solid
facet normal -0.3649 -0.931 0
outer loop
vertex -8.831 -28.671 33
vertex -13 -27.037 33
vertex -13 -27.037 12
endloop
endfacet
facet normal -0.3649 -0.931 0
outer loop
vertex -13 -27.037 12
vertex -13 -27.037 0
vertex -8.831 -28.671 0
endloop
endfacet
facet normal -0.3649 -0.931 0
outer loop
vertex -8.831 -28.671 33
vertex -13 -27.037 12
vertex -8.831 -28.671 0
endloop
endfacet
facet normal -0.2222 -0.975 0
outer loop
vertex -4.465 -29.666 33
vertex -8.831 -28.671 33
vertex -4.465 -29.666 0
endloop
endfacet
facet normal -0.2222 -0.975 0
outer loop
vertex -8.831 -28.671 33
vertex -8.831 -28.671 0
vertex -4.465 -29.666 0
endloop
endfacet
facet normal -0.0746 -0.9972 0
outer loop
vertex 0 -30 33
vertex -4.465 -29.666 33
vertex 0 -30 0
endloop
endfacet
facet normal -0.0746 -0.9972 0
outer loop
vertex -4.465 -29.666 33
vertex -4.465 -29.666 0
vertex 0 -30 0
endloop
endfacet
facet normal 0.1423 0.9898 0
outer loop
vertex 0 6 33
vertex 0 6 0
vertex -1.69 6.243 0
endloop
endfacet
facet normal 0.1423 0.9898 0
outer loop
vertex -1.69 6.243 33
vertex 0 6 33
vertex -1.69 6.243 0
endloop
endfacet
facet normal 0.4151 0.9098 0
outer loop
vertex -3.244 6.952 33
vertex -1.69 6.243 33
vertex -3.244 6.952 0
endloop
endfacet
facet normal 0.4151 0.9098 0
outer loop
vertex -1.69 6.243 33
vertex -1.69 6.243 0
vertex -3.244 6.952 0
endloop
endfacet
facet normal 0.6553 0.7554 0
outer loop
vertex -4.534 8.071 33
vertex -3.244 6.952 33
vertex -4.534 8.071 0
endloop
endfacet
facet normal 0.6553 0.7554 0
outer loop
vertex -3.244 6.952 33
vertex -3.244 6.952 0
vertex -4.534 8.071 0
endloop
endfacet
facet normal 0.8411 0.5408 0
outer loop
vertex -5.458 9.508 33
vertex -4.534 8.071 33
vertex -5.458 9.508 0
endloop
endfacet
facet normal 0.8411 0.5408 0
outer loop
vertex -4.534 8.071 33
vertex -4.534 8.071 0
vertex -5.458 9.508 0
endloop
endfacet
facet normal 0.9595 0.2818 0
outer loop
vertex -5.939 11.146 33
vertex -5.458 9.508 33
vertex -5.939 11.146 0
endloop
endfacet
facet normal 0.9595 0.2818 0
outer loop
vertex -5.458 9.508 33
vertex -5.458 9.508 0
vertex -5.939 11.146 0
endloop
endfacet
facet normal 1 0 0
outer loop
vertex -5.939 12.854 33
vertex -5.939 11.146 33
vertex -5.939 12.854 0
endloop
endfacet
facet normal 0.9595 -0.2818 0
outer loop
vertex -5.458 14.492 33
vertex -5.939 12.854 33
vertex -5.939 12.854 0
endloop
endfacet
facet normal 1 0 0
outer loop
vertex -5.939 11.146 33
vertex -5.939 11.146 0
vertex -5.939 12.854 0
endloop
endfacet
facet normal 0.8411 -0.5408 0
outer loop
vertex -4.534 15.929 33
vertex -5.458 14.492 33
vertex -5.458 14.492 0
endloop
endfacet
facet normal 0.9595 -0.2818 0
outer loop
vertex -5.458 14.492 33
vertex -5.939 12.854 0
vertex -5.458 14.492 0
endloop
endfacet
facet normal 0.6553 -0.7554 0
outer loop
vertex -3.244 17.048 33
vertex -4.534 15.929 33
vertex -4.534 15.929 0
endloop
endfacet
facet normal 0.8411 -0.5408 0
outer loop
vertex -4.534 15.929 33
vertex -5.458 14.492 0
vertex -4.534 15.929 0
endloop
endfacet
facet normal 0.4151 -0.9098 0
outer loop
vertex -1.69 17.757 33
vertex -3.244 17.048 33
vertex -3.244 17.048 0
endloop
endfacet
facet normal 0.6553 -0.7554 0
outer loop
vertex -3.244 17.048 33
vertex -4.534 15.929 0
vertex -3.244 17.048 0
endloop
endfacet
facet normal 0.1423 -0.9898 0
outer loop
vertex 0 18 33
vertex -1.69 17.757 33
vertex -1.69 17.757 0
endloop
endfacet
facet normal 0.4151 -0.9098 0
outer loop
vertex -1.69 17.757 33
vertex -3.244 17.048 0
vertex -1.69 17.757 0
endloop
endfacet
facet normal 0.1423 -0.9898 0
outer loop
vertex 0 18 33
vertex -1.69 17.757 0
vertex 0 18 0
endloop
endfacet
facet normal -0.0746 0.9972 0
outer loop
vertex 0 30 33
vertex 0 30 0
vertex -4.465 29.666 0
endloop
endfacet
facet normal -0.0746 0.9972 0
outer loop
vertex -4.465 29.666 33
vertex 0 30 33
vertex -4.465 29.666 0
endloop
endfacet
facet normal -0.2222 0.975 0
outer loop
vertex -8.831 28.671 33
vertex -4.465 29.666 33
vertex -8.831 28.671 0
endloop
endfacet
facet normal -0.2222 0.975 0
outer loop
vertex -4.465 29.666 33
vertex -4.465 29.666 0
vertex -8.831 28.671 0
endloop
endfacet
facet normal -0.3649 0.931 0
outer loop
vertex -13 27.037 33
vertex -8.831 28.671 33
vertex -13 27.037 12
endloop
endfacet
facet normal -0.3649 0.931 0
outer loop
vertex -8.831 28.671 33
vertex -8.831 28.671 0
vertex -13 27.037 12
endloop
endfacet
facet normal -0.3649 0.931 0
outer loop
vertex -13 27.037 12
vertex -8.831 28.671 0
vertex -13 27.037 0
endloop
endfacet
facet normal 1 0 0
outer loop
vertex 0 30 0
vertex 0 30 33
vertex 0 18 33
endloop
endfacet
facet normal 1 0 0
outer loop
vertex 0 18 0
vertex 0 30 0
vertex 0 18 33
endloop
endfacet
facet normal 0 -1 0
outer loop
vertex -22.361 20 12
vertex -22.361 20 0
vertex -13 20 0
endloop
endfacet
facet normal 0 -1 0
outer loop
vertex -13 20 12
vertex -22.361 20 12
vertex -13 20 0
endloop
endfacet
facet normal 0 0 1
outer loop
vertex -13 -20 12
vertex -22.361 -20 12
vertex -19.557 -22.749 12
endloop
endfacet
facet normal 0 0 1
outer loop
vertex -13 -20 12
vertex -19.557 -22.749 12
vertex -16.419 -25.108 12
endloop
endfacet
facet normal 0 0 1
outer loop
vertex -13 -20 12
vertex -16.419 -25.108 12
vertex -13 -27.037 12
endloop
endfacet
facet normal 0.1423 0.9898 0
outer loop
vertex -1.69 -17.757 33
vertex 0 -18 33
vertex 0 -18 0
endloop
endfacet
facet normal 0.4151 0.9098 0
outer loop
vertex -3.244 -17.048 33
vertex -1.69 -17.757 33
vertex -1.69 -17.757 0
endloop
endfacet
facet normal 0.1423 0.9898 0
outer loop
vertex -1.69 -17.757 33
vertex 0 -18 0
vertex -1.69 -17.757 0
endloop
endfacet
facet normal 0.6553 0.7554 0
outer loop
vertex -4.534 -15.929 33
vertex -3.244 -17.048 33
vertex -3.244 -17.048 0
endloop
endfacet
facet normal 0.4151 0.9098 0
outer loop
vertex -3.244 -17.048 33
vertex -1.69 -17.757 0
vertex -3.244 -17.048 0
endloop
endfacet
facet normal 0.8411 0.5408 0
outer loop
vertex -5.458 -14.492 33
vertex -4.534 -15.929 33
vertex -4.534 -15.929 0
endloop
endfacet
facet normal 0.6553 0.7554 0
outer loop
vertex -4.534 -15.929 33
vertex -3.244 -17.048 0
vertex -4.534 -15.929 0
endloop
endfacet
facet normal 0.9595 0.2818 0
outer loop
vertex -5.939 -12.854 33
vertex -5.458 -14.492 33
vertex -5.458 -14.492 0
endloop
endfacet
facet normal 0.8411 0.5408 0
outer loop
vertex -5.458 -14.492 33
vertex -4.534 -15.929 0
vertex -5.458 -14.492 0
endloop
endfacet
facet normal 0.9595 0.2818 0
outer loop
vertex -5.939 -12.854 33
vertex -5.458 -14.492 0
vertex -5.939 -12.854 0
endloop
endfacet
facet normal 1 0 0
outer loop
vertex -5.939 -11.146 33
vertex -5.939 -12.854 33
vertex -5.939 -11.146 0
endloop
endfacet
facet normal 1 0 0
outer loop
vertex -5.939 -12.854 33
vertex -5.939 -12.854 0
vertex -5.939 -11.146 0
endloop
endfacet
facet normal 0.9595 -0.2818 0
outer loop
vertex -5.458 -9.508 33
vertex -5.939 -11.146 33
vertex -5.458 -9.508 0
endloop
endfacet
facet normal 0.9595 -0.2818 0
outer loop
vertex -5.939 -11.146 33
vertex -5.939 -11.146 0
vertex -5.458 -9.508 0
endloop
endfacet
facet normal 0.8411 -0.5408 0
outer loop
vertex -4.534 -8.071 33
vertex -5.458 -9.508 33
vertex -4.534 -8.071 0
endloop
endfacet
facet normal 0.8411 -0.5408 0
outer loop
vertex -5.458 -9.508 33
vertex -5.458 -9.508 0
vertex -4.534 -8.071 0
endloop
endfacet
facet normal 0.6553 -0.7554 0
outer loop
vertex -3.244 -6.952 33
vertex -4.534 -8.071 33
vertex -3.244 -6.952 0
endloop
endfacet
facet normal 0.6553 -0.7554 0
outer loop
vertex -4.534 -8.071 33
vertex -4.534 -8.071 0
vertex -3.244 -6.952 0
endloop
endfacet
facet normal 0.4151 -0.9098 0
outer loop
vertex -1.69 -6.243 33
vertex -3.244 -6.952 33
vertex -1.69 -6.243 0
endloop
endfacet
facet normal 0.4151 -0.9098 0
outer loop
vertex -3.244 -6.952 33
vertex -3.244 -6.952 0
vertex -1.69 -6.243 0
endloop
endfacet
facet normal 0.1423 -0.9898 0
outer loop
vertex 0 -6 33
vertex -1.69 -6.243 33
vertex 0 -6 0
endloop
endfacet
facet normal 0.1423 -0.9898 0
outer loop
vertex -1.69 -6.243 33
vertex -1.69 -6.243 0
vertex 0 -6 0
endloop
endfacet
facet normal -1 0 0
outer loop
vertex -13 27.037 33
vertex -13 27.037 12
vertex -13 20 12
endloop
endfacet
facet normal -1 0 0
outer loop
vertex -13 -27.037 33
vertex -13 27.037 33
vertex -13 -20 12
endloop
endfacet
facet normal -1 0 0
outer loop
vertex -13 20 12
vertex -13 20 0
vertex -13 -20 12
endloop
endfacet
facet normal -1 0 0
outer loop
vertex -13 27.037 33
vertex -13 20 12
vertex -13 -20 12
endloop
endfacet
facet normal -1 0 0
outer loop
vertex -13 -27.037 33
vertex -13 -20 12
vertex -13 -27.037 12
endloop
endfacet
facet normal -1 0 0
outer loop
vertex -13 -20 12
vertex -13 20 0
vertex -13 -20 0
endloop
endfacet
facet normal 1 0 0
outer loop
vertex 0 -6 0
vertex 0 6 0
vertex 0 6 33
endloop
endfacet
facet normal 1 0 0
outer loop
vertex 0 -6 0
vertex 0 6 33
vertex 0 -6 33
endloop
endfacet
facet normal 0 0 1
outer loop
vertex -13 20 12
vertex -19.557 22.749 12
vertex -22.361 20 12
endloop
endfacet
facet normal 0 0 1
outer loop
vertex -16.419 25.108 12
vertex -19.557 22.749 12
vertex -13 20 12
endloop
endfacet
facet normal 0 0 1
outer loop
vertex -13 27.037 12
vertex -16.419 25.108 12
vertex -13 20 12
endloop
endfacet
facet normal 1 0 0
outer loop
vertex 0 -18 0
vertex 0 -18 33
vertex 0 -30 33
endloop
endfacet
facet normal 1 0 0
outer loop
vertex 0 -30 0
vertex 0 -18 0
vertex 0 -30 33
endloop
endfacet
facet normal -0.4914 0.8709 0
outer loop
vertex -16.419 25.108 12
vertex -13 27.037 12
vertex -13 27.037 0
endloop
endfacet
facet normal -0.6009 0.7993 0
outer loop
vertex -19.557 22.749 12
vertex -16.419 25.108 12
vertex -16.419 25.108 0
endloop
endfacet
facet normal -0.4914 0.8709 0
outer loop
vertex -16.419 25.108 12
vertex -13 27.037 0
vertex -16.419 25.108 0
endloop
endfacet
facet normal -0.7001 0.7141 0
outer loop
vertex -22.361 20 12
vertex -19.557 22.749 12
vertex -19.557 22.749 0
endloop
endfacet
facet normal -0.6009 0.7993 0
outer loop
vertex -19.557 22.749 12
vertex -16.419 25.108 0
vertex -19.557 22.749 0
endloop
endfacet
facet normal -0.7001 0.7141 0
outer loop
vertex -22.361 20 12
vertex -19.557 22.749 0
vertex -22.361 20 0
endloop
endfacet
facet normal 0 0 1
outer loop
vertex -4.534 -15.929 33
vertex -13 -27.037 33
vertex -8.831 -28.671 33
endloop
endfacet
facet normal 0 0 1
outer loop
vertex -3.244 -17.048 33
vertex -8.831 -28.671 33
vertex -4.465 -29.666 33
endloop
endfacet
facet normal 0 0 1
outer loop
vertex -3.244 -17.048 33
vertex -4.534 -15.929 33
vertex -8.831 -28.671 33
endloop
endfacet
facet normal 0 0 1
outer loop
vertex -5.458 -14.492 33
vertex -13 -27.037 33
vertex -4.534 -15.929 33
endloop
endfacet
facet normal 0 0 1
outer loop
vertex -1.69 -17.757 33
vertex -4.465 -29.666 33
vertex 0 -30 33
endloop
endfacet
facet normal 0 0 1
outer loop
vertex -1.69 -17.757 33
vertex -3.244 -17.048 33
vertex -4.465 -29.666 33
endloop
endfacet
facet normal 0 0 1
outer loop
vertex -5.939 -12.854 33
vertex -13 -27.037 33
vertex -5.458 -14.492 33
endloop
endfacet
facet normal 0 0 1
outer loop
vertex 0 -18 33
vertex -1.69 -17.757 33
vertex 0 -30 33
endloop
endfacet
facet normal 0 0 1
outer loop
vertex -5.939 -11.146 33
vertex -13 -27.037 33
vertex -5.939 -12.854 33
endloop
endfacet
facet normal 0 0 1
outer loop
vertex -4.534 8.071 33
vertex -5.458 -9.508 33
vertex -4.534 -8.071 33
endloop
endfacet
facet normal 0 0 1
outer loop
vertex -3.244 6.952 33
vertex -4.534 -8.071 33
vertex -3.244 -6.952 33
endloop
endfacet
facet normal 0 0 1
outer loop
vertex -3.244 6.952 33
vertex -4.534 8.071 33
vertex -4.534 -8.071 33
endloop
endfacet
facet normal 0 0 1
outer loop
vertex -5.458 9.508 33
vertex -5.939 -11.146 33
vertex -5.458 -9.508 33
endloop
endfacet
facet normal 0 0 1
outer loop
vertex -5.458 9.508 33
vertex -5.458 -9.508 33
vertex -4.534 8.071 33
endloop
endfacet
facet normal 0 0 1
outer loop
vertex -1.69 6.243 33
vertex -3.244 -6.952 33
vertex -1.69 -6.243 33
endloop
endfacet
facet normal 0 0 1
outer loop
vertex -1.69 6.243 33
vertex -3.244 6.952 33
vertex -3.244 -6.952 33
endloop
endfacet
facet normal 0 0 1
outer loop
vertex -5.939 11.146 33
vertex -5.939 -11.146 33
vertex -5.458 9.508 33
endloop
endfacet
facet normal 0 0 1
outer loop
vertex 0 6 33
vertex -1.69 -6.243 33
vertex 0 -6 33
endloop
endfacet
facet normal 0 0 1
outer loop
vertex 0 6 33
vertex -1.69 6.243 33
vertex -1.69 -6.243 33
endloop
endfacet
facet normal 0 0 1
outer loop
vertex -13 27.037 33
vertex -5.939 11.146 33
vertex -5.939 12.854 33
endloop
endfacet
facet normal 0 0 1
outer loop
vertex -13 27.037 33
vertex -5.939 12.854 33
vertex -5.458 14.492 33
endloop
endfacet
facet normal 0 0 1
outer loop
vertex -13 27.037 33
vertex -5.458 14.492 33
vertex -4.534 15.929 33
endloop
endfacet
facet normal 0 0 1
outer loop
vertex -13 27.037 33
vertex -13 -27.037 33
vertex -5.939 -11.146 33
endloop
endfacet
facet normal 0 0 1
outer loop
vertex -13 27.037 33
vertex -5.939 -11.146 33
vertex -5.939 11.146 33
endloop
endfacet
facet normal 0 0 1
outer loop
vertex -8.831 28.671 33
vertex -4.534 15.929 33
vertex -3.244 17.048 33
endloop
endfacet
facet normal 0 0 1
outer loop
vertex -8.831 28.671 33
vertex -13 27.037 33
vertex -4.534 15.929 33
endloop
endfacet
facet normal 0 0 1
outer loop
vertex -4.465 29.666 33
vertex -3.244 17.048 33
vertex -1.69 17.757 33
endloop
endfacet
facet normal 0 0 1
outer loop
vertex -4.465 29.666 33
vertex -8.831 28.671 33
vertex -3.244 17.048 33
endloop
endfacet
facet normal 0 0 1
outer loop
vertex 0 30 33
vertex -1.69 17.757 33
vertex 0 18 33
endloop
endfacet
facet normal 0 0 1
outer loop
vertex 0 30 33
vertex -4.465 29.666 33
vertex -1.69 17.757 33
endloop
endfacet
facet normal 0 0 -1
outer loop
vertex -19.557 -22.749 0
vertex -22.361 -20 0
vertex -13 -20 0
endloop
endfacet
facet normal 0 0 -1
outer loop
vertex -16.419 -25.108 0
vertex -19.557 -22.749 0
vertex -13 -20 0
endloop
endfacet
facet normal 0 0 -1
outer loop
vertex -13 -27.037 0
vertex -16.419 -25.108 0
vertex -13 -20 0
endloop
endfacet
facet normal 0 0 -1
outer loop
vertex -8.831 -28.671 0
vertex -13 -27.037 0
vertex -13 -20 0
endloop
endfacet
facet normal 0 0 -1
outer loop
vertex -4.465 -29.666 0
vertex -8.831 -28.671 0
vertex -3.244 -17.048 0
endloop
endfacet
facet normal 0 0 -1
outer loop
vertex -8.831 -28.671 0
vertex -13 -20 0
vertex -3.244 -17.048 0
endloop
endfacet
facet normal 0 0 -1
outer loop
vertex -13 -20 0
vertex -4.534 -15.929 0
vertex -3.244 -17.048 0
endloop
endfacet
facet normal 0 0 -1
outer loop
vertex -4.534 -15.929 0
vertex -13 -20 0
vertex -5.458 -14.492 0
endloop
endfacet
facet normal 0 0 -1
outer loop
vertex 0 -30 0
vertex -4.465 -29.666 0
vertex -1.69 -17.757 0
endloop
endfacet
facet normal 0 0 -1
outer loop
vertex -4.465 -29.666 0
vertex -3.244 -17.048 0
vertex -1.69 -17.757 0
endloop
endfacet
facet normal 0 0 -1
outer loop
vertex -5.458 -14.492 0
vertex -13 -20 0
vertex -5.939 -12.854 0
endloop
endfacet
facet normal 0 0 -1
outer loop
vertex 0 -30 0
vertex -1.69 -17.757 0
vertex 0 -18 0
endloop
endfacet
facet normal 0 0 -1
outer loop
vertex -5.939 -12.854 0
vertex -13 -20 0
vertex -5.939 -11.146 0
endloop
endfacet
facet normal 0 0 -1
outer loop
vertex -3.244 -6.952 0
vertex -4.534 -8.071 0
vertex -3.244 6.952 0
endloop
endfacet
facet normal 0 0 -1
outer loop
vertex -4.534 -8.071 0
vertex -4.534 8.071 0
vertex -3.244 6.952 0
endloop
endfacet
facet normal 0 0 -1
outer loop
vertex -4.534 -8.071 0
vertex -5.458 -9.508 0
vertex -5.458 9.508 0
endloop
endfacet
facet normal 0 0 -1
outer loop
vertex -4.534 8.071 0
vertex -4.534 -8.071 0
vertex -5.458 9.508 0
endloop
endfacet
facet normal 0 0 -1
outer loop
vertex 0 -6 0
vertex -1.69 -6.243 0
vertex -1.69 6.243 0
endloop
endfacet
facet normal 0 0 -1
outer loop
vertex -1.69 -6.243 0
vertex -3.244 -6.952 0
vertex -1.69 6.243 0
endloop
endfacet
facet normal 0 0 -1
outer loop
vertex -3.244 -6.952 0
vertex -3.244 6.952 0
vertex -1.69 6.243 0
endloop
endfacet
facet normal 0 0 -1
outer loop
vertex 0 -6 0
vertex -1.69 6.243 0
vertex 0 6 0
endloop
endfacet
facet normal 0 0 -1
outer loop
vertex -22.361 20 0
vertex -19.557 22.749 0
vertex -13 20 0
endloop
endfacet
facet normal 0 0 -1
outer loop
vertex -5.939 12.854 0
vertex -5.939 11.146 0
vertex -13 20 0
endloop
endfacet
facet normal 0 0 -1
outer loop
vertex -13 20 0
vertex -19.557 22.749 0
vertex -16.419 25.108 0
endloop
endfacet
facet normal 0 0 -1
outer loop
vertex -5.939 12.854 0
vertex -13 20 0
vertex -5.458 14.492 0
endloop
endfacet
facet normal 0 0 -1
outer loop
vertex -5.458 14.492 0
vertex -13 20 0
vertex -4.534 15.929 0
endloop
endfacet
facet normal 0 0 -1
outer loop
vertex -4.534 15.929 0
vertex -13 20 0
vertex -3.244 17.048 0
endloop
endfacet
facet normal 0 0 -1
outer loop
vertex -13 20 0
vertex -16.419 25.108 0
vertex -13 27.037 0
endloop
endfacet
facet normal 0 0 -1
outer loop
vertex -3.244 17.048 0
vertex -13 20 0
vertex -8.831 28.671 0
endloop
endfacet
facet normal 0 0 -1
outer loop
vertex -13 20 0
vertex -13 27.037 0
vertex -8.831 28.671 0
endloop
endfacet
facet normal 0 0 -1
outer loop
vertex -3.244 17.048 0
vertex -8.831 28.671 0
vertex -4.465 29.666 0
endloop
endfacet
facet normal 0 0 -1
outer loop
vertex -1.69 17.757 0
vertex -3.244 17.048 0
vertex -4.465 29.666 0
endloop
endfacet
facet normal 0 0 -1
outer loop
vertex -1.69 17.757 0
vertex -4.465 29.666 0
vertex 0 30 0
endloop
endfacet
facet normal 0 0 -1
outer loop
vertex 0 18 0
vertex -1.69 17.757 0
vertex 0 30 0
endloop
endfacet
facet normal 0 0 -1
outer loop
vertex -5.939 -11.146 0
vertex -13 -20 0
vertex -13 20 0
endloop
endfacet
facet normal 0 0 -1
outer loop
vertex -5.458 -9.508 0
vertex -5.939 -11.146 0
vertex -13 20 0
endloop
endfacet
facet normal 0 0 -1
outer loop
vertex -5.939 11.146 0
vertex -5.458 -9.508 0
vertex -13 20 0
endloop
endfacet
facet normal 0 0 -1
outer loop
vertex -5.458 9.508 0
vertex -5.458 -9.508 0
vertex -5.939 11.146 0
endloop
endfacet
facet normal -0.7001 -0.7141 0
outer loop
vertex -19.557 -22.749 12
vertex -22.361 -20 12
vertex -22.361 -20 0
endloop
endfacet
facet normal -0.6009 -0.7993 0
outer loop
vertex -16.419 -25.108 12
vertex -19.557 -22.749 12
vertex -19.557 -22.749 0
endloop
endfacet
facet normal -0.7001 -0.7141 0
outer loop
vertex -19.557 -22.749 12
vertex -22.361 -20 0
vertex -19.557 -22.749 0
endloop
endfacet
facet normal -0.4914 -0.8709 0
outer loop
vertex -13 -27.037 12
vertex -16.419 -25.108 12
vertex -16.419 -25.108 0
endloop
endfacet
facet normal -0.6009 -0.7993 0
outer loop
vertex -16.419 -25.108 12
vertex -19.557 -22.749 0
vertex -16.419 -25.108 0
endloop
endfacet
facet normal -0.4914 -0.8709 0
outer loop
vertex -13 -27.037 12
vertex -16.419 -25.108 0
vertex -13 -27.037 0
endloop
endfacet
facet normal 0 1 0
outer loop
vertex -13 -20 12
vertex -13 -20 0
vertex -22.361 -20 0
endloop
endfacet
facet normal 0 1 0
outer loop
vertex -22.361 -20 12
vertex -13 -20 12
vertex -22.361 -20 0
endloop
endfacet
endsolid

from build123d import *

# Parameters (mm, degrees)
F1_DEPTH = 33
F3_DEPTH = 12
F5_DEPTH = 33.001


with BuildPart() as f1:
    # F0 (on Top) → F1 (new body)
    with BuildSketch(Plane.XY):
        with BuildLine():
            Line((-13, 27.037012), (13, 27.037012))
            ThreePointArc((13, 27.037012), (0, 30), (-13, 27.037012))
        make_face()
        with BuildLine():
            ThreePointArc((-13, -27.037012), (0, -30), (13, -27.037012))
            Line((13, -27.037012), (-13, -27.037012))
        make_face()
        with BuildLine():
            Line((13, -12), (6, -12))
            ThreePointArc((6, -12), (0, -18), (-6, -12))
            Line((-6, -12), (-13, -12))
            Line((-13, -12), (-13, -27.037012))
            Line((-13, -27.037012), (13, -27.037012))
            Line((13, -27.037012), (13, -12))
        make_face()
        with BuildLine():
            ThreePointArc((-6, -12), (0, -6), (6, -12))
            Line((6, -12), (13, -12))
            Line((13, -12), (13, 12))
            Line((13, 12), (6, 12))
            ThreePointArc((6, 12), (0, 6), (-6, 12))
            Line((-6, 12), (-13, 12))
            Line((-13, 12), (-13, -12))
            Line((-13, -12), (-6, -12))
        make_face()
        with BuildLine():
            Line((6, 12), (13, 12))
            Line((13, 12), (13, 27.037012))
            Line((13, 27.037012), (-13, 27.037012))
            Line((-13, 27.037012), (-13, 12))
            Line((-13, 12), (-6, 12))
            ThreePointArc((-6, 12), (0, 18), (6, 12))
        make_face()
    extrude(amount=F1_DEPTH)

    # F2 (on Top) → F3 (join)
    with BuildSketch(Plane.XY):
        with BuildLine():
            Line((-12.883144, 20), (22.36068, 20))
            ThreePointArc((22.36068, 20), (0, 30), (-22.36068, 20))
            Line((-22.36068, 20), (-12.883144, 20))
        make_face()
        with BuildLine():
            ThreePointArc((-22.36068, -20), (0, -30), (22.36068, -20))
            Line((22.36068, -20), (-12.883144, -20))
            Line((-12.883144, -20), (-22.36068, -20))
        make_face()
    extrude(amount=F3_DEPTH)

    # F4 (on face) → F5 (cut, through all)
    with BuildSketch(Plane.XY.offset(33)):
        Polygon((0, 36.60208), (0, 35.889369), (0, 33.03853), (0, -37.947364), (28.590711, -37.947364), (28.590711, 36.60208), align=None)
    extrude(amount=-F5_DEPTH, mode=Mode.SUBTRACT)


solid = f1.part
